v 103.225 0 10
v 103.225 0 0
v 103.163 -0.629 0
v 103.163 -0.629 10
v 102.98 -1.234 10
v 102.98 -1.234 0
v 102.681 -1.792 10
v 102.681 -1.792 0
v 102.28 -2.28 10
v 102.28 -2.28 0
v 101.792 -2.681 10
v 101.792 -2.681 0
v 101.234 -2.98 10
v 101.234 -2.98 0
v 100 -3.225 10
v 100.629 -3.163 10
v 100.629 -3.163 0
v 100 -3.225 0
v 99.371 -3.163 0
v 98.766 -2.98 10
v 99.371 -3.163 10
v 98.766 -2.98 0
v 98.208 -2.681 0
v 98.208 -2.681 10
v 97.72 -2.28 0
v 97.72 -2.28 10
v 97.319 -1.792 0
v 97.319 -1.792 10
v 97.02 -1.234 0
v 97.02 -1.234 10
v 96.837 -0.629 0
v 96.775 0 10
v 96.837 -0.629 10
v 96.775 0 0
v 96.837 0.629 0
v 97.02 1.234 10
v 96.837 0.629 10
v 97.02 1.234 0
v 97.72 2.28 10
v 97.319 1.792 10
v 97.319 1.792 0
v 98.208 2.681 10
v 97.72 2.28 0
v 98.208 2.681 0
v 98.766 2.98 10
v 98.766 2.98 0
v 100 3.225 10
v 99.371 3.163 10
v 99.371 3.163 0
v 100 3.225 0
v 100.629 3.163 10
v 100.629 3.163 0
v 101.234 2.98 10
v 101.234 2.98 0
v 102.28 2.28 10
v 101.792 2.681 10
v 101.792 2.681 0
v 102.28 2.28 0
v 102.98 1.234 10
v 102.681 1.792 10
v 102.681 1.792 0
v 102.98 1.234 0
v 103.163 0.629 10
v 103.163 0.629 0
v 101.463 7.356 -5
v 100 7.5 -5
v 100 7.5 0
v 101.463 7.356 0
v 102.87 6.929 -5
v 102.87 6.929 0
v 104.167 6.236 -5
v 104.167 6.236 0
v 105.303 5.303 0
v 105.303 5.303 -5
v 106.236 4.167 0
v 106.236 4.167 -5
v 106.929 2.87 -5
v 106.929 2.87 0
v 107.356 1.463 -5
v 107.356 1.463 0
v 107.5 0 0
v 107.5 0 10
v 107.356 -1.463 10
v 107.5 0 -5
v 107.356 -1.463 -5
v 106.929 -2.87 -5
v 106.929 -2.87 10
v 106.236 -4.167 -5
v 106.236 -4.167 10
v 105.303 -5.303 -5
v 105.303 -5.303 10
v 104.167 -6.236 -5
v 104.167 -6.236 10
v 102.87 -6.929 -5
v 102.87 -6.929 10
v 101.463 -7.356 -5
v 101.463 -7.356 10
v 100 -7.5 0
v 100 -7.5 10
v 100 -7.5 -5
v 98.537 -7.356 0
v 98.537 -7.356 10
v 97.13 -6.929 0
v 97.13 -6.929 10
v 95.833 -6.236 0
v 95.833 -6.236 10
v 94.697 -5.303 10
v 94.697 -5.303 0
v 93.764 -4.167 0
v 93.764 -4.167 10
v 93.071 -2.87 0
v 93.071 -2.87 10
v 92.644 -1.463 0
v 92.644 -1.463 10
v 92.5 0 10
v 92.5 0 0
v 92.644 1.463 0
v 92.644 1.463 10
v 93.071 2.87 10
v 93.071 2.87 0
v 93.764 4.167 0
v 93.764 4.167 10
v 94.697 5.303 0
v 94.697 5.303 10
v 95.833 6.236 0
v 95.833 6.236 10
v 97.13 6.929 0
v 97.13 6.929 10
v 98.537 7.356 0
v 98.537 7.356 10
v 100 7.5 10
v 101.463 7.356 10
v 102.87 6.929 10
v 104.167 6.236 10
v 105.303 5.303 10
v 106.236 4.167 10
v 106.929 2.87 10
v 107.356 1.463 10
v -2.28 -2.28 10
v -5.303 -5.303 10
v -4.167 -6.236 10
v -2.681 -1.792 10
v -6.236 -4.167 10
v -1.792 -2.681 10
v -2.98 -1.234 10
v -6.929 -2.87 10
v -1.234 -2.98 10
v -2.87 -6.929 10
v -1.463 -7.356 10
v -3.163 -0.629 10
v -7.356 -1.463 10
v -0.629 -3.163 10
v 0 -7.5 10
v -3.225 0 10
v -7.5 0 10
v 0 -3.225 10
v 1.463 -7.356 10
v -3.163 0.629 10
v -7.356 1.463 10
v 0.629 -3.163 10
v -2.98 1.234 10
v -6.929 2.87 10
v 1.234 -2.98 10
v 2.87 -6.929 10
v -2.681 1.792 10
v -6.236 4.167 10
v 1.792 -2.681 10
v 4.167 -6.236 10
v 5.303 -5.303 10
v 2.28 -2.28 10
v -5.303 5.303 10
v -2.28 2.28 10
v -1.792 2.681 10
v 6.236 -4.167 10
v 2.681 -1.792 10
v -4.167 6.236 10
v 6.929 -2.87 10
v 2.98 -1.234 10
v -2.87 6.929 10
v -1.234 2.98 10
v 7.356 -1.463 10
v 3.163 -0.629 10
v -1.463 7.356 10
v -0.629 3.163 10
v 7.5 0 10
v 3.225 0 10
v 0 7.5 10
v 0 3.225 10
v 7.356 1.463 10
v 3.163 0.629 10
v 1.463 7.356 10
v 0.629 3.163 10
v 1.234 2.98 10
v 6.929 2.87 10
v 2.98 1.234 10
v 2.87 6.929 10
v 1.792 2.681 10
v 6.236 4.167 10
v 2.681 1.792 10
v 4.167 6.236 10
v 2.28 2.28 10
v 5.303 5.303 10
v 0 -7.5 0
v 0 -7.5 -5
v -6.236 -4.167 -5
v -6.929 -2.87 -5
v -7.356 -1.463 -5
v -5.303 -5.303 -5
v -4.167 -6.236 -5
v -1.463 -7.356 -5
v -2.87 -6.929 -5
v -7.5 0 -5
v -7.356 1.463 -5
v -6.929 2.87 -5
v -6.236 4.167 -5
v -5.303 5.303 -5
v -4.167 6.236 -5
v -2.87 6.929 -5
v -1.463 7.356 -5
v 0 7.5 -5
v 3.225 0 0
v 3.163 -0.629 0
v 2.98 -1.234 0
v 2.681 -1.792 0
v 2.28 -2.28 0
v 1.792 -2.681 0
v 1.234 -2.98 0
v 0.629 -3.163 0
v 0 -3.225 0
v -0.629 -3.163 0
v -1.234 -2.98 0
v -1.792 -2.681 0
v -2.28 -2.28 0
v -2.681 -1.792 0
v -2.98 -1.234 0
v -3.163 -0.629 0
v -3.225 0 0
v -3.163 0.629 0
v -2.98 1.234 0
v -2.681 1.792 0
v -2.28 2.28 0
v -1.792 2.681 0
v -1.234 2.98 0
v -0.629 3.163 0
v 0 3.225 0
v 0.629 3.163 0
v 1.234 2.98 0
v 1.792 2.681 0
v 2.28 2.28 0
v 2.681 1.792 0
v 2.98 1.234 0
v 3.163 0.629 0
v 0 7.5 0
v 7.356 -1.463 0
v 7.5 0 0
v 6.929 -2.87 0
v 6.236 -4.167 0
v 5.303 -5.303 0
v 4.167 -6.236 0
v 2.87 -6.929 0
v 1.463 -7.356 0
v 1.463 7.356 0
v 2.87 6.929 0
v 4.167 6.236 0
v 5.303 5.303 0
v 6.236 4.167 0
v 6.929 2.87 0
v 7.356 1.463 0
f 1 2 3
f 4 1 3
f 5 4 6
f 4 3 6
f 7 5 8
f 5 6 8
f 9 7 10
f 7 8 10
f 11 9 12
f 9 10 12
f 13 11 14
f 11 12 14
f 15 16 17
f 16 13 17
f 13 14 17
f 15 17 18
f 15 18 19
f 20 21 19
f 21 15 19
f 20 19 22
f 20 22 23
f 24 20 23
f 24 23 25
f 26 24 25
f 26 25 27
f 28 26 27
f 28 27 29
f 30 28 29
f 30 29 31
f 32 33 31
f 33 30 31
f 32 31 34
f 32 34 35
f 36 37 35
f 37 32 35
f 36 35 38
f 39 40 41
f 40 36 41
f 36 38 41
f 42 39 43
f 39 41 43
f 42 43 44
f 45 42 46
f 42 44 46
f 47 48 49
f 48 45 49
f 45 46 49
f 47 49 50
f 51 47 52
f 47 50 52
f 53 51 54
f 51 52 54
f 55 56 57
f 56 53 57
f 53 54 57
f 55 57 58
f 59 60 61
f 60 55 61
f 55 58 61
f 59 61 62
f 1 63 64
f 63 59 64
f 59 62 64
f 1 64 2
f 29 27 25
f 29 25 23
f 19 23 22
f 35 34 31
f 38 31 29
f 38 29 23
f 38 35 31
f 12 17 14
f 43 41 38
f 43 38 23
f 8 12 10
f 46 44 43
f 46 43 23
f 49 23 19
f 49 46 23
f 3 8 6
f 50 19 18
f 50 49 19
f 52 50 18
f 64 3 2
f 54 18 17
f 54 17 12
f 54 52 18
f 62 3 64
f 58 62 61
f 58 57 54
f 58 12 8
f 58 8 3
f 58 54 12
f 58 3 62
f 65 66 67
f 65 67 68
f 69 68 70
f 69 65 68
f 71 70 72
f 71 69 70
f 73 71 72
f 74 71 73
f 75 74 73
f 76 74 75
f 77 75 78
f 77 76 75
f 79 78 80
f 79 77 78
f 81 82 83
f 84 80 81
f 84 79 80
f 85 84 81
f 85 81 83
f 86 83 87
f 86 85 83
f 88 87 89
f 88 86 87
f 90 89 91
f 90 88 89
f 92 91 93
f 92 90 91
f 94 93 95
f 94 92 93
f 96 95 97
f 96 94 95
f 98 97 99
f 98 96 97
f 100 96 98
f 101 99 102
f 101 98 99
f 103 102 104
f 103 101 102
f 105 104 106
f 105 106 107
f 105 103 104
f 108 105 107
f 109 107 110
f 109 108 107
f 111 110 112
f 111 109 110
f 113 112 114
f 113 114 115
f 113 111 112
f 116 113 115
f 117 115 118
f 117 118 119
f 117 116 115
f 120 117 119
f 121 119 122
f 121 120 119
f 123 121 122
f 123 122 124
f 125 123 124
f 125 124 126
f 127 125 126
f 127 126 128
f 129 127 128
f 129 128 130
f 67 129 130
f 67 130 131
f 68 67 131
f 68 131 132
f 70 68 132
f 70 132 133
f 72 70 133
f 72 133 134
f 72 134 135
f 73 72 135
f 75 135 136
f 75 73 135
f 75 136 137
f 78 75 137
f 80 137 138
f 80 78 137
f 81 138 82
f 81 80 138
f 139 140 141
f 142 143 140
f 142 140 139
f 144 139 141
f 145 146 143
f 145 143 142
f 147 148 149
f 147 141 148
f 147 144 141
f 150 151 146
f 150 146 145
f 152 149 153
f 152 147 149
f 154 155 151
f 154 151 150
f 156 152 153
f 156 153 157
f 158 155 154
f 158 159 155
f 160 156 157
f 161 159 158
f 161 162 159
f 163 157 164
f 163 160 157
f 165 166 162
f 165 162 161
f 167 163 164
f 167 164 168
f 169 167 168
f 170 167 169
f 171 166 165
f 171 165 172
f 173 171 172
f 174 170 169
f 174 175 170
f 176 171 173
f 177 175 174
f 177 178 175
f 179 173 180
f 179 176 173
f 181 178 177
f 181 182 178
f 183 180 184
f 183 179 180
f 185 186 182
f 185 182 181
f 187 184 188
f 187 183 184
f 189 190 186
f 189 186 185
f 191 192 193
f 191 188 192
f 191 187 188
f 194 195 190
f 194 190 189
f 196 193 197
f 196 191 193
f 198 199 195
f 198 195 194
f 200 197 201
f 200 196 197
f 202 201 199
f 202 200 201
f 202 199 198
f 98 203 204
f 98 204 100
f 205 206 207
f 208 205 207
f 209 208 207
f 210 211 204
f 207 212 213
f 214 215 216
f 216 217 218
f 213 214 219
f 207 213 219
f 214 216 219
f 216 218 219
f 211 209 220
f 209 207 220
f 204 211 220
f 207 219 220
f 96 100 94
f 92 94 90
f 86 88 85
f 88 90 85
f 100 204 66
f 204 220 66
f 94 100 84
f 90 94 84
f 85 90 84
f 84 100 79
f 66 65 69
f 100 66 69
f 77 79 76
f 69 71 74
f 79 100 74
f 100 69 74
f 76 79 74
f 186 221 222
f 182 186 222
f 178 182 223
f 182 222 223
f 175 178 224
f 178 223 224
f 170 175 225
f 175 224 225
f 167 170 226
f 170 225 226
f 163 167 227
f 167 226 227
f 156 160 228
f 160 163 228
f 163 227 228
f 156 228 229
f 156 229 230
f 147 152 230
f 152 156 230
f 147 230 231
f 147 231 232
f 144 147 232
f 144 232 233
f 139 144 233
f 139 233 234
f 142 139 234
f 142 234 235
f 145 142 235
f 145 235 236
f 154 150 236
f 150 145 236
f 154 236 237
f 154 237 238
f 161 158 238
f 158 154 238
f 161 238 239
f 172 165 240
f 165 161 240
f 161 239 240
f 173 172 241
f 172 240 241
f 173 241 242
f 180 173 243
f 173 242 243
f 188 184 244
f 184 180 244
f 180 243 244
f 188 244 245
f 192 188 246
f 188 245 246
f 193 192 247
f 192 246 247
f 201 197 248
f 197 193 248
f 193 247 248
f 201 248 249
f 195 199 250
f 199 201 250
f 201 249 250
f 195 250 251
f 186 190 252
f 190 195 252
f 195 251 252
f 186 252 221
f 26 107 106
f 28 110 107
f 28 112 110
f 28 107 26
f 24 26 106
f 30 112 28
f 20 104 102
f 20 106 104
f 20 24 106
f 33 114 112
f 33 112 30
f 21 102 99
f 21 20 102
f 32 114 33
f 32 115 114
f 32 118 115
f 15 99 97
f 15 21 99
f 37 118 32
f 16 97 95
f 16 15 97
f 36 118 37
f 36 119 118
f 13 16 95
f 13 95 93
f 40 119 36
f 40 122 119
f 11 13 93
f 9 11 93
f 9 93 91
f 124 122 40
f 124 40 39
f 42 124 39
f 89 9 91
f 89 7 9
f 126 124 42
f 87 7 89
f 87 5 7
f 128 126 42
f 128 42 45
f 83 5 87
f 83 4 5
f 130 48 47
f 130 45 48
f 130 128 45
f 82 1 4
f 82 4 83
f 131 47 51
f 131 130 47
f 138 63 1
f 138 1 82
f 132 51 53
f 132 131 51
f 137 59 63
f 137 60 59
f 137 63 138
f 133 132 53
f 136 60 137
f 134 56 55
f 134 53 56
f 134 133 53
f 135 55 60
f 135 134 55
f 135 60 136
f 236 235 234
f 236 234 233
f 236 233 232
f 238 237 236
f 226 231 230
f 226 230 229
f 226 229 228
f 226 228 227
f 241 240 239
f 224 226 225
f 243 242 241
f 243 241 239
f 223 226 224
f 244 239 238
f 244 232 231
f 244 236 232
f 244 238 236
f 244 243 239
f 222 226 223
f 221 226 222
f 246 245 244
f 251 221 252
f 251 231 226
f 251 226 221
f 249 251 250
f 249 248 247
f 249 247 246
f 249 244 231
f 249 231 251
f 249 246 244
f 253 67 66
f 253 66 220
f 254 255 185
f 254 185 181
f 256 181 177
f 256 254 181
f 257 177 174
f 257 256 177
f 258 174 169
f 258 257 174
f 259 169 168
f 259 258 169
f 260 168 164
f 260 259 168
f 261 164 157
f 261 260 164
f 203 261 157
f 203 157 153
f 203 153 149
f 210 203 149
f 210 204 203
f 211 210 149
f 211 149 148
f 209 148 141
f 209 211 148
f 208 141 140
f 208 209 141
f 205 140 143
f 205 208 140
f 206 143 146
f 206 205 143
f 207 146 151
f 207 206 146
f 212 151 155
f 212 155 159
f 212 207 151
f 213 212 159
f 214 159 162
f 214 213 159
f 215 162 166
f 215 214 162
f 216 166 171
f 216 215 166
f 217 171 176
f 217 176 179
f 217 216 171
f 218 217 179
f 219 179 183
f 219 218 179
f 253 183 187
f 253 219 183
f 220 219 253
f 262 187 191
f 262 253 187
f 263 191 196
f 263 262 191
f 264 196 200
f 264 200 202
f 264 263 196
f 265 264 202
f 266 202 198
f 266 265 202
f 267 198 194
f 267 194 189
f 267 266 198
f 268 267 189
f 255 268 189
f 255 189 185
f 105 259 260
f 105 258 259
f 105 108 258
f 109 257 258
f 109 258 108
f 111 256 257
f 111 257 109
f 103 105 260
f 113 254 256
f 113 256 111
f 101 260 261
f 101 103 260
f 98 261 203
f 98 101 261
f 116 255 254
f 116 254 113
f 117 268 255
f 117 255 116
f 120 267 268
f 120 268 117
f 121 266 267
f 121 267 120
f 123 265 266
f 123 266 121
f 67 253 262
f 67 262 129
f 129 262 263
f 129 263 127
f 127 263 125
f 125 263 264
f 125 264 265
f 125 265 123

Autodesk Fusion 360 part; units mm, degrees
sketch "Sketch1" plane through (0, 0, 0) normal (0, 0, 1) x (1, 0, 0)
  circle A0 centre (0, 0) radius 3.225
  circle A1 centre (100, 0) radius 3.225
  circle A2 centre (0, 0) radius 7.5
  circle A3 centre (100, 0) radius 7.5
  line L0 (100, 7.5) -> (0, 7.5)
  line L1 (0, -7.5) -> (100, -7.5)
  dimension "d3" = 6.45
  dimension "d4" = 6.45
  dimension "d5" = 100
  dimension "d6" = 15
  dimension "d7" = 15
extrude "Extrude1" add sketch "Sketch1" along normal blind 10 contours A2 | A3 makes body 1 at (7.4627, -0.7468, 3.3333) makes body 2 at (107.4627, -0.7468, 3.3333)
extrude "Extrude2" add sketch "Sketch1" against normal blind 5 contours A0 | A1 | A2 | A2 A3 L0 L1 | A3 bodies 1 2
equation "HoleDiam = 6.45 mm"
equation "SliderDistance = 100 mm"
equation "d3 = HoleDiam"
equation "d4 = HoleDiam"
equation "d5 = SliderDistance"
